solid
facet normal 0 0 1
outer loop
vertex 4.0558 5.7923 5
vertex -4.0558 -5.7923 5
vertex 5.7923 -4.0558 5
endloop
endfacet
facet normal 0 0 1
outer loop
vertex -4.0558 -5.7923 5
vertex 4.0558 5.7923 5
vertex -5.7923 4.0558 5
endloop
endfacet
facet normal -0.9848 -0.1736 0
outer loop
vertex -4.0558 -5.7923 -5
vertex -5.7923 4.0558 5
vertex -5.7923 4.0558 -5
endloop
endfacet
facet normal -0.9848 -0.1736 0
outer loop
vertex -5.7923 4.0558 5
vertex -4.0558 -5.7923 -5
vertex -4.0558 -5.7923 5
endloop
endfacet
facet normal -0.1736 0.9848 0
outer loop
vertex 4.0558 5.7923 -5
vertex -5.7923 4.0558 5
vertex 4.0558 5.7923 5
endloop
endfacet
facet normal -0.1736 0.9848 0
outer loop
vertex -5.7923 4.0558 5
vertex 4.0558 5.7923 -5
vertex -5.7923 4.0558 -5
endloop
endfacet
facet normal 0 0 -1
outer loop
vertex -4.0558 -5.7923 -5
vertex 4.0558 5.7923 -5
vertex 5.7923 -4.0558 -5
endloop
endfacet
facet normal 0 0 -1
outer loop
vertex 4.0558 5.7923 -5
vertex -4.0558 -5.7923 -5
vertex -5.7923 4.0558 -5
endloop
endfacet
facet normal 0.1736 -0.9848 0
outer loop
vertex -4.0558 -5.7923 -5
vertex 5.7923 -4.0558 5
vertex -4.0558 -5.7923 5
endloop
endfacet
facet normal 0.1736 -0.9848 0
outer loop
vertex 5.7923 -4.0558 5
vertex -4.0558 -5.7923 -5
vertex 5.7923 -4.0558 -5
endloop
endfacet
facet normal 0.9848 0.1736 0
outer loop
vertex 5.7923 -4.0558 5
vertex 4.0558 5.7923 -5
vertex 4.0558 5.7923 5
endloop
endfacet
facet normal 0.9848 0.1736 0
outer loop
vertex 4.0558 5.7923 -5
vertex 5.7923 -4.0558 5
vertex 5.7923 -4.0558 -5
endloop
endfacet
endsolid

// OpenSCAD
difference() {
    rotate([0,0,10]) {
        cube(10, center=true);
    }
    translate([0, 20, 0]) {
        cube(20, center=true);
    }
}
